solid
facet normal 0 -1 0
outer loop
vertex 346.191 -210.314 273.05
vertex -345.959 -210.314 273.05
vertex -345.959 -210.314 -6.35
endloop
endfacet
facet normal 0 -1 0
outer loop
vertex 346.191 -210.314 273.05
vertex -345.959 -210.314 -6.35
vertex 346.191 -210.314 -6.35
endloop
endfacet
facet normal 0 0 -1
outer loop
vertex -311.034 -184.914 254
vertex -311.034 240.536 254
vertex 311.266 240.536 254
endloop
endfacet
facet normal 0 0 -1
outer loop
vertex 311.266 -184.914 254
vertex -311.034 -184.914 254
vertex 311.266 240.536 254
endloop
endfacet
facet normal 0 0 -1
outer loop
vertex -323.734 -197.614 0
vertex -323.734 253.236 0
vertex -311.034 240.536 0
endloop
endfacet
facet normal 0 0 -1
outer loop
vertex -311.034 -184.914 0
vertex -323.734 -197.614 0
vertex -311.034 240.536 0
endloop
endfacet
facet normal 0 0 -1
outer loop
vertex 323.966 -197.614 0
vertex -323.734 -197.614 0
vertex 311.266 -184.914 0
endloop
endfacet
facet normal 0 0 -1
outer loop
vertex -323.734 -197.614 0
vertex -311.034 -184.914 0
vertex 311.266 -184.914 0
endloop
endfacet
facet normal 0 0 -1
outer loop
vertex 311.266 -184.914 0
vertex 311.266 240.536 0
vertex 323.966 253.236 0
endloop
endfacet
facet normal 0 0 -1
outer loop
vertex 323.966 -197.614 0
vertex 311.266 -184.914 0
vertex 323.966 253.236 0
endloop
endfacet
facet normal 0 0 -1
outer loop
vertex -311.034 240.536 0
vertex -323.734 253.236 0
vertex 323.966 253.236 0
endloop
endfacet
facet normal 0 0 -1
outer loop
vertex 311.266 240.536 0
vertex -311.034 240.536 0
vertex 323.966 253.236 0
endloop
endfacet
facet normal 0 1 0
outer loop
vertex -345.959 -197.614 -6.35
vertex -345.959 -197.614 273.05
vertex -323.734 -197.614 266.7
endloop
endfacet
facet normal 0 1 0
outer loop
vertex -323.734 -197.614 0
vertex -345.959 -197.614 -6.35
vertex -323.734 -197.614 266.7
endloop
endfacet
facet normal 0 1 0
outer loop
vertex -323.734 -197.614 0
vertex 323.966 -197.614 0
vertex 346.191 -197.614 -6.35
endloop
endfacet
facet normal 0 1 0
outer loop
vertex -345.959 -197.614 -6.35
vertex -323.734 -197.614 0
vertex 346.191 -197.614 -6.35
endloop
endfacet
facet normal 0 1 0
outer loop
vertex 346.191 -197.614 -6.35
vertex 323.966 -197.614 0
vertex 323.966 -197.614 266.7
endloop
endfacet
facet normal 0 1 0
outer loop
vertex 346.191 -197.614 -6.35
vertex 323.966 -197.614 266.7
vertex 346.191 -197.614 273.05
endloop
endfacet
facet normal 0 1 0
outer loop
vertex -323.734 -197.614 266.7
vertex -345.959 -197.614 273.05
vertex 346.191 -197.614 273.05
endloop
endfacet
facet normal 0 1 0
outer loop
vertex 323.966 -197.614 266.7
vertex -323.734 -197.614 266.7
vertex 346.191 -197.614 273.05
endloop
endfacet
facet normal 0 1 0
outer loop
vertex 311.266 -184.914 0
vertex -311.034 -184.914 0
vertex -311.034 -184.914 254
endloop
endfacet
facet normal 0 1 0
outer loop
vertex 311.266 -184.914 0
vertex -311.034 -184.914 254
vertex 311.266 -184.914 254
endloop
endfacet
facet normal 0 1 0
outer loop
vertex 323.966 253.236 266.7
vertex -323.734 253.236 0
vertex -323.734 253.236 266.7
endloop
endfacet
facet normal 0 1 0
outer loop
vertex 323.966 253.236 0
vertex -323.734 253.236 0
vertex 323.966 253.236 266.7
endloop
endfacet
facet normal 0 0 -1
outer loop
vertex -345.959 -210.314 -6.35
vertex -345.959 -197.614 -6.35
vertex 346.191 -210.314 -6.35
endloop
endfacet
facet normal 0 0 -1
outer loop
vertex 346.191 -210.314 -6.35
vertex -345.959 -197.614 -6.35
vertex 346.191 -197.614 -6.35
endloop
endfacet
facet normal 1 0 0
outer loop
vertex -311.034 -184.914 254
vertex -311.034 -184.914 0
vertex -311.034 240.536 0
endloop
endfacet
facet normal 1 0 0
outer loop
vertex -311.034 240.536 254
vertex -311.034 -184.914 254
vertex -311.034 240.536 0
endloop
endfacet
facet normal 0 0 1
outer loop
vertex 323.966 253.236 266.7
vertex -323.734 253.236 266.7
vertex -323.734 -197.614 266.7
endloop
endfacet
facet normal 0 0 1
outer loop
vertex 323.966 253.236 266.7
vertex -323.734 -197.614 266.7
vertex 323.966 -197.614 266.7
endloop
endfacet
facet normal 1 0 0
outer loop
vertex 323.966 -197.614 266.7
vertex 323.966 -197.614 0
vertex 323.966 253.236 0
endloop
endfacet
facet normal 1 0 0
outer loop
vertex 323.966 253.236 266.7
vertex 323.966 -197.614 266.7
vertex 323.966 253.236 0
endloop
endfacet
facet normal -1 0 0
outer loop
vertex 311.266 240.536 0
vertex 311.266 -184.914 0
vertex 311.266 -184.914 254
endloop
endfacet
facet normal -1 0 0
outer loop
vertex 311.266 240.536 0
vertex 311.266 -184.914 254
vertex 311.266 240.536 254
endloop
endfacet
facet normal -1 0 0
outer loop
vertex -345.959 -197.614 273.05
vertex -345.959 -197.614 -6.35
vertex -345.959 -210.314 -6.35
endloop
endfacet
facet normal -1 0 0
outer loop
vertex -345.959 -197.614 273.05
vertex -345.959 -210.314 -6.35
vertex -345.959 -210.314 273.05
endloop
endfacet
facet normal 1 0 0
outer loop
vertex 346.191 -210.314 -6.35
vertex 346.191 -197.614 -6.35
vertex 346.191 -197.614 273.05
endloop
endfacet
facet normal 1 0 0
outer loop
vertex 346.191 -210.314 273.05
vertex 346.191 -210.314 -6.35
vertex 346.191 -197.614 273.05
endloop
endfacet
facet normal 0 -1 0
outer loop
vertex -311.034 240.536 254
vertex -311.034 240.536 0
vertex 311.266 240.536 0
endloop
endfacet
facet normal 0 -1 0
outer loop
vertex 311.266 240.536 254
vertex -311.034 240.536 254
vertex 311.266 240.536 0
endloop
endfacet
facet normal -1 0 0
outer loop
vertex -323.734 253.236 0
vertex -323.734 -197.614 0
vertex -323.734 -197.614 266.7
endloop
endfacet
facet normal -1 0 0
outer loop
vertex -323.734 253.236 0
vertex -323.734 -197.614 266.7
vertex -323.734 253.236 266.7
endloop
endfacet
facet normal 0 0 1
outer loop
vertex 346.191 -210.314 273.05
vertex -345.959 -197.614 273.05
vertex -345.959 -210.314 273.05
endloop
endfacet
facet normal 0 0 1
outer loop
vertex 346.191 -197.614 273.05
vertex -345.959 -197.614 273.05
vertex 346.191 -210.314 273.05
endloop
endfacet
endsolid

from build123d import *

# Parameters (mm, degrees)
F0_W     = 647.7
F0_H     = 450.85
F0_W_2   = 622.3
F0_H_2   = 425.45
F1_DEPTH = 266.7
F2_W     = 692.15
F2_H     = 279.4
F3_DEPTH = 12.7
F4_W     = 622.3
F4_H     = 425.45
F5_DEPTH = 12.7


with BuildPart() as f1:
    # F0 (on Top) → F1 (new body)
    with BuildSketch(Plane.XY):
        with Locations((0.116292, 27.810883)):
            Rectangle(F0_W, F0_H)
        with Locations((0.116292, 27.810883)):
            Rectangle(F0_W_2, F0_H_2, mode=Mode.SUBTRACT)
    extrude(amount=F1_DEPTH)

    # F2 (on face) → F3 (join)
    with BuildSketch(Plane.XZ.offset(197.614117)):
        with Locations((0.116292, 133.35)):
            Rectangle(F2_W, F2_H)
    extrude(amount=F3_DEPTH)

    # F4 (on face) → F5 (join)
    with BuildSketch(Plane.XY.offset(266.7)):
        with Locations((0.116292, 27.810883)):
            Rectangle(F4_W, F4_H)
    extrude(amount=-F5_DEPTH)


solid = f1.part
